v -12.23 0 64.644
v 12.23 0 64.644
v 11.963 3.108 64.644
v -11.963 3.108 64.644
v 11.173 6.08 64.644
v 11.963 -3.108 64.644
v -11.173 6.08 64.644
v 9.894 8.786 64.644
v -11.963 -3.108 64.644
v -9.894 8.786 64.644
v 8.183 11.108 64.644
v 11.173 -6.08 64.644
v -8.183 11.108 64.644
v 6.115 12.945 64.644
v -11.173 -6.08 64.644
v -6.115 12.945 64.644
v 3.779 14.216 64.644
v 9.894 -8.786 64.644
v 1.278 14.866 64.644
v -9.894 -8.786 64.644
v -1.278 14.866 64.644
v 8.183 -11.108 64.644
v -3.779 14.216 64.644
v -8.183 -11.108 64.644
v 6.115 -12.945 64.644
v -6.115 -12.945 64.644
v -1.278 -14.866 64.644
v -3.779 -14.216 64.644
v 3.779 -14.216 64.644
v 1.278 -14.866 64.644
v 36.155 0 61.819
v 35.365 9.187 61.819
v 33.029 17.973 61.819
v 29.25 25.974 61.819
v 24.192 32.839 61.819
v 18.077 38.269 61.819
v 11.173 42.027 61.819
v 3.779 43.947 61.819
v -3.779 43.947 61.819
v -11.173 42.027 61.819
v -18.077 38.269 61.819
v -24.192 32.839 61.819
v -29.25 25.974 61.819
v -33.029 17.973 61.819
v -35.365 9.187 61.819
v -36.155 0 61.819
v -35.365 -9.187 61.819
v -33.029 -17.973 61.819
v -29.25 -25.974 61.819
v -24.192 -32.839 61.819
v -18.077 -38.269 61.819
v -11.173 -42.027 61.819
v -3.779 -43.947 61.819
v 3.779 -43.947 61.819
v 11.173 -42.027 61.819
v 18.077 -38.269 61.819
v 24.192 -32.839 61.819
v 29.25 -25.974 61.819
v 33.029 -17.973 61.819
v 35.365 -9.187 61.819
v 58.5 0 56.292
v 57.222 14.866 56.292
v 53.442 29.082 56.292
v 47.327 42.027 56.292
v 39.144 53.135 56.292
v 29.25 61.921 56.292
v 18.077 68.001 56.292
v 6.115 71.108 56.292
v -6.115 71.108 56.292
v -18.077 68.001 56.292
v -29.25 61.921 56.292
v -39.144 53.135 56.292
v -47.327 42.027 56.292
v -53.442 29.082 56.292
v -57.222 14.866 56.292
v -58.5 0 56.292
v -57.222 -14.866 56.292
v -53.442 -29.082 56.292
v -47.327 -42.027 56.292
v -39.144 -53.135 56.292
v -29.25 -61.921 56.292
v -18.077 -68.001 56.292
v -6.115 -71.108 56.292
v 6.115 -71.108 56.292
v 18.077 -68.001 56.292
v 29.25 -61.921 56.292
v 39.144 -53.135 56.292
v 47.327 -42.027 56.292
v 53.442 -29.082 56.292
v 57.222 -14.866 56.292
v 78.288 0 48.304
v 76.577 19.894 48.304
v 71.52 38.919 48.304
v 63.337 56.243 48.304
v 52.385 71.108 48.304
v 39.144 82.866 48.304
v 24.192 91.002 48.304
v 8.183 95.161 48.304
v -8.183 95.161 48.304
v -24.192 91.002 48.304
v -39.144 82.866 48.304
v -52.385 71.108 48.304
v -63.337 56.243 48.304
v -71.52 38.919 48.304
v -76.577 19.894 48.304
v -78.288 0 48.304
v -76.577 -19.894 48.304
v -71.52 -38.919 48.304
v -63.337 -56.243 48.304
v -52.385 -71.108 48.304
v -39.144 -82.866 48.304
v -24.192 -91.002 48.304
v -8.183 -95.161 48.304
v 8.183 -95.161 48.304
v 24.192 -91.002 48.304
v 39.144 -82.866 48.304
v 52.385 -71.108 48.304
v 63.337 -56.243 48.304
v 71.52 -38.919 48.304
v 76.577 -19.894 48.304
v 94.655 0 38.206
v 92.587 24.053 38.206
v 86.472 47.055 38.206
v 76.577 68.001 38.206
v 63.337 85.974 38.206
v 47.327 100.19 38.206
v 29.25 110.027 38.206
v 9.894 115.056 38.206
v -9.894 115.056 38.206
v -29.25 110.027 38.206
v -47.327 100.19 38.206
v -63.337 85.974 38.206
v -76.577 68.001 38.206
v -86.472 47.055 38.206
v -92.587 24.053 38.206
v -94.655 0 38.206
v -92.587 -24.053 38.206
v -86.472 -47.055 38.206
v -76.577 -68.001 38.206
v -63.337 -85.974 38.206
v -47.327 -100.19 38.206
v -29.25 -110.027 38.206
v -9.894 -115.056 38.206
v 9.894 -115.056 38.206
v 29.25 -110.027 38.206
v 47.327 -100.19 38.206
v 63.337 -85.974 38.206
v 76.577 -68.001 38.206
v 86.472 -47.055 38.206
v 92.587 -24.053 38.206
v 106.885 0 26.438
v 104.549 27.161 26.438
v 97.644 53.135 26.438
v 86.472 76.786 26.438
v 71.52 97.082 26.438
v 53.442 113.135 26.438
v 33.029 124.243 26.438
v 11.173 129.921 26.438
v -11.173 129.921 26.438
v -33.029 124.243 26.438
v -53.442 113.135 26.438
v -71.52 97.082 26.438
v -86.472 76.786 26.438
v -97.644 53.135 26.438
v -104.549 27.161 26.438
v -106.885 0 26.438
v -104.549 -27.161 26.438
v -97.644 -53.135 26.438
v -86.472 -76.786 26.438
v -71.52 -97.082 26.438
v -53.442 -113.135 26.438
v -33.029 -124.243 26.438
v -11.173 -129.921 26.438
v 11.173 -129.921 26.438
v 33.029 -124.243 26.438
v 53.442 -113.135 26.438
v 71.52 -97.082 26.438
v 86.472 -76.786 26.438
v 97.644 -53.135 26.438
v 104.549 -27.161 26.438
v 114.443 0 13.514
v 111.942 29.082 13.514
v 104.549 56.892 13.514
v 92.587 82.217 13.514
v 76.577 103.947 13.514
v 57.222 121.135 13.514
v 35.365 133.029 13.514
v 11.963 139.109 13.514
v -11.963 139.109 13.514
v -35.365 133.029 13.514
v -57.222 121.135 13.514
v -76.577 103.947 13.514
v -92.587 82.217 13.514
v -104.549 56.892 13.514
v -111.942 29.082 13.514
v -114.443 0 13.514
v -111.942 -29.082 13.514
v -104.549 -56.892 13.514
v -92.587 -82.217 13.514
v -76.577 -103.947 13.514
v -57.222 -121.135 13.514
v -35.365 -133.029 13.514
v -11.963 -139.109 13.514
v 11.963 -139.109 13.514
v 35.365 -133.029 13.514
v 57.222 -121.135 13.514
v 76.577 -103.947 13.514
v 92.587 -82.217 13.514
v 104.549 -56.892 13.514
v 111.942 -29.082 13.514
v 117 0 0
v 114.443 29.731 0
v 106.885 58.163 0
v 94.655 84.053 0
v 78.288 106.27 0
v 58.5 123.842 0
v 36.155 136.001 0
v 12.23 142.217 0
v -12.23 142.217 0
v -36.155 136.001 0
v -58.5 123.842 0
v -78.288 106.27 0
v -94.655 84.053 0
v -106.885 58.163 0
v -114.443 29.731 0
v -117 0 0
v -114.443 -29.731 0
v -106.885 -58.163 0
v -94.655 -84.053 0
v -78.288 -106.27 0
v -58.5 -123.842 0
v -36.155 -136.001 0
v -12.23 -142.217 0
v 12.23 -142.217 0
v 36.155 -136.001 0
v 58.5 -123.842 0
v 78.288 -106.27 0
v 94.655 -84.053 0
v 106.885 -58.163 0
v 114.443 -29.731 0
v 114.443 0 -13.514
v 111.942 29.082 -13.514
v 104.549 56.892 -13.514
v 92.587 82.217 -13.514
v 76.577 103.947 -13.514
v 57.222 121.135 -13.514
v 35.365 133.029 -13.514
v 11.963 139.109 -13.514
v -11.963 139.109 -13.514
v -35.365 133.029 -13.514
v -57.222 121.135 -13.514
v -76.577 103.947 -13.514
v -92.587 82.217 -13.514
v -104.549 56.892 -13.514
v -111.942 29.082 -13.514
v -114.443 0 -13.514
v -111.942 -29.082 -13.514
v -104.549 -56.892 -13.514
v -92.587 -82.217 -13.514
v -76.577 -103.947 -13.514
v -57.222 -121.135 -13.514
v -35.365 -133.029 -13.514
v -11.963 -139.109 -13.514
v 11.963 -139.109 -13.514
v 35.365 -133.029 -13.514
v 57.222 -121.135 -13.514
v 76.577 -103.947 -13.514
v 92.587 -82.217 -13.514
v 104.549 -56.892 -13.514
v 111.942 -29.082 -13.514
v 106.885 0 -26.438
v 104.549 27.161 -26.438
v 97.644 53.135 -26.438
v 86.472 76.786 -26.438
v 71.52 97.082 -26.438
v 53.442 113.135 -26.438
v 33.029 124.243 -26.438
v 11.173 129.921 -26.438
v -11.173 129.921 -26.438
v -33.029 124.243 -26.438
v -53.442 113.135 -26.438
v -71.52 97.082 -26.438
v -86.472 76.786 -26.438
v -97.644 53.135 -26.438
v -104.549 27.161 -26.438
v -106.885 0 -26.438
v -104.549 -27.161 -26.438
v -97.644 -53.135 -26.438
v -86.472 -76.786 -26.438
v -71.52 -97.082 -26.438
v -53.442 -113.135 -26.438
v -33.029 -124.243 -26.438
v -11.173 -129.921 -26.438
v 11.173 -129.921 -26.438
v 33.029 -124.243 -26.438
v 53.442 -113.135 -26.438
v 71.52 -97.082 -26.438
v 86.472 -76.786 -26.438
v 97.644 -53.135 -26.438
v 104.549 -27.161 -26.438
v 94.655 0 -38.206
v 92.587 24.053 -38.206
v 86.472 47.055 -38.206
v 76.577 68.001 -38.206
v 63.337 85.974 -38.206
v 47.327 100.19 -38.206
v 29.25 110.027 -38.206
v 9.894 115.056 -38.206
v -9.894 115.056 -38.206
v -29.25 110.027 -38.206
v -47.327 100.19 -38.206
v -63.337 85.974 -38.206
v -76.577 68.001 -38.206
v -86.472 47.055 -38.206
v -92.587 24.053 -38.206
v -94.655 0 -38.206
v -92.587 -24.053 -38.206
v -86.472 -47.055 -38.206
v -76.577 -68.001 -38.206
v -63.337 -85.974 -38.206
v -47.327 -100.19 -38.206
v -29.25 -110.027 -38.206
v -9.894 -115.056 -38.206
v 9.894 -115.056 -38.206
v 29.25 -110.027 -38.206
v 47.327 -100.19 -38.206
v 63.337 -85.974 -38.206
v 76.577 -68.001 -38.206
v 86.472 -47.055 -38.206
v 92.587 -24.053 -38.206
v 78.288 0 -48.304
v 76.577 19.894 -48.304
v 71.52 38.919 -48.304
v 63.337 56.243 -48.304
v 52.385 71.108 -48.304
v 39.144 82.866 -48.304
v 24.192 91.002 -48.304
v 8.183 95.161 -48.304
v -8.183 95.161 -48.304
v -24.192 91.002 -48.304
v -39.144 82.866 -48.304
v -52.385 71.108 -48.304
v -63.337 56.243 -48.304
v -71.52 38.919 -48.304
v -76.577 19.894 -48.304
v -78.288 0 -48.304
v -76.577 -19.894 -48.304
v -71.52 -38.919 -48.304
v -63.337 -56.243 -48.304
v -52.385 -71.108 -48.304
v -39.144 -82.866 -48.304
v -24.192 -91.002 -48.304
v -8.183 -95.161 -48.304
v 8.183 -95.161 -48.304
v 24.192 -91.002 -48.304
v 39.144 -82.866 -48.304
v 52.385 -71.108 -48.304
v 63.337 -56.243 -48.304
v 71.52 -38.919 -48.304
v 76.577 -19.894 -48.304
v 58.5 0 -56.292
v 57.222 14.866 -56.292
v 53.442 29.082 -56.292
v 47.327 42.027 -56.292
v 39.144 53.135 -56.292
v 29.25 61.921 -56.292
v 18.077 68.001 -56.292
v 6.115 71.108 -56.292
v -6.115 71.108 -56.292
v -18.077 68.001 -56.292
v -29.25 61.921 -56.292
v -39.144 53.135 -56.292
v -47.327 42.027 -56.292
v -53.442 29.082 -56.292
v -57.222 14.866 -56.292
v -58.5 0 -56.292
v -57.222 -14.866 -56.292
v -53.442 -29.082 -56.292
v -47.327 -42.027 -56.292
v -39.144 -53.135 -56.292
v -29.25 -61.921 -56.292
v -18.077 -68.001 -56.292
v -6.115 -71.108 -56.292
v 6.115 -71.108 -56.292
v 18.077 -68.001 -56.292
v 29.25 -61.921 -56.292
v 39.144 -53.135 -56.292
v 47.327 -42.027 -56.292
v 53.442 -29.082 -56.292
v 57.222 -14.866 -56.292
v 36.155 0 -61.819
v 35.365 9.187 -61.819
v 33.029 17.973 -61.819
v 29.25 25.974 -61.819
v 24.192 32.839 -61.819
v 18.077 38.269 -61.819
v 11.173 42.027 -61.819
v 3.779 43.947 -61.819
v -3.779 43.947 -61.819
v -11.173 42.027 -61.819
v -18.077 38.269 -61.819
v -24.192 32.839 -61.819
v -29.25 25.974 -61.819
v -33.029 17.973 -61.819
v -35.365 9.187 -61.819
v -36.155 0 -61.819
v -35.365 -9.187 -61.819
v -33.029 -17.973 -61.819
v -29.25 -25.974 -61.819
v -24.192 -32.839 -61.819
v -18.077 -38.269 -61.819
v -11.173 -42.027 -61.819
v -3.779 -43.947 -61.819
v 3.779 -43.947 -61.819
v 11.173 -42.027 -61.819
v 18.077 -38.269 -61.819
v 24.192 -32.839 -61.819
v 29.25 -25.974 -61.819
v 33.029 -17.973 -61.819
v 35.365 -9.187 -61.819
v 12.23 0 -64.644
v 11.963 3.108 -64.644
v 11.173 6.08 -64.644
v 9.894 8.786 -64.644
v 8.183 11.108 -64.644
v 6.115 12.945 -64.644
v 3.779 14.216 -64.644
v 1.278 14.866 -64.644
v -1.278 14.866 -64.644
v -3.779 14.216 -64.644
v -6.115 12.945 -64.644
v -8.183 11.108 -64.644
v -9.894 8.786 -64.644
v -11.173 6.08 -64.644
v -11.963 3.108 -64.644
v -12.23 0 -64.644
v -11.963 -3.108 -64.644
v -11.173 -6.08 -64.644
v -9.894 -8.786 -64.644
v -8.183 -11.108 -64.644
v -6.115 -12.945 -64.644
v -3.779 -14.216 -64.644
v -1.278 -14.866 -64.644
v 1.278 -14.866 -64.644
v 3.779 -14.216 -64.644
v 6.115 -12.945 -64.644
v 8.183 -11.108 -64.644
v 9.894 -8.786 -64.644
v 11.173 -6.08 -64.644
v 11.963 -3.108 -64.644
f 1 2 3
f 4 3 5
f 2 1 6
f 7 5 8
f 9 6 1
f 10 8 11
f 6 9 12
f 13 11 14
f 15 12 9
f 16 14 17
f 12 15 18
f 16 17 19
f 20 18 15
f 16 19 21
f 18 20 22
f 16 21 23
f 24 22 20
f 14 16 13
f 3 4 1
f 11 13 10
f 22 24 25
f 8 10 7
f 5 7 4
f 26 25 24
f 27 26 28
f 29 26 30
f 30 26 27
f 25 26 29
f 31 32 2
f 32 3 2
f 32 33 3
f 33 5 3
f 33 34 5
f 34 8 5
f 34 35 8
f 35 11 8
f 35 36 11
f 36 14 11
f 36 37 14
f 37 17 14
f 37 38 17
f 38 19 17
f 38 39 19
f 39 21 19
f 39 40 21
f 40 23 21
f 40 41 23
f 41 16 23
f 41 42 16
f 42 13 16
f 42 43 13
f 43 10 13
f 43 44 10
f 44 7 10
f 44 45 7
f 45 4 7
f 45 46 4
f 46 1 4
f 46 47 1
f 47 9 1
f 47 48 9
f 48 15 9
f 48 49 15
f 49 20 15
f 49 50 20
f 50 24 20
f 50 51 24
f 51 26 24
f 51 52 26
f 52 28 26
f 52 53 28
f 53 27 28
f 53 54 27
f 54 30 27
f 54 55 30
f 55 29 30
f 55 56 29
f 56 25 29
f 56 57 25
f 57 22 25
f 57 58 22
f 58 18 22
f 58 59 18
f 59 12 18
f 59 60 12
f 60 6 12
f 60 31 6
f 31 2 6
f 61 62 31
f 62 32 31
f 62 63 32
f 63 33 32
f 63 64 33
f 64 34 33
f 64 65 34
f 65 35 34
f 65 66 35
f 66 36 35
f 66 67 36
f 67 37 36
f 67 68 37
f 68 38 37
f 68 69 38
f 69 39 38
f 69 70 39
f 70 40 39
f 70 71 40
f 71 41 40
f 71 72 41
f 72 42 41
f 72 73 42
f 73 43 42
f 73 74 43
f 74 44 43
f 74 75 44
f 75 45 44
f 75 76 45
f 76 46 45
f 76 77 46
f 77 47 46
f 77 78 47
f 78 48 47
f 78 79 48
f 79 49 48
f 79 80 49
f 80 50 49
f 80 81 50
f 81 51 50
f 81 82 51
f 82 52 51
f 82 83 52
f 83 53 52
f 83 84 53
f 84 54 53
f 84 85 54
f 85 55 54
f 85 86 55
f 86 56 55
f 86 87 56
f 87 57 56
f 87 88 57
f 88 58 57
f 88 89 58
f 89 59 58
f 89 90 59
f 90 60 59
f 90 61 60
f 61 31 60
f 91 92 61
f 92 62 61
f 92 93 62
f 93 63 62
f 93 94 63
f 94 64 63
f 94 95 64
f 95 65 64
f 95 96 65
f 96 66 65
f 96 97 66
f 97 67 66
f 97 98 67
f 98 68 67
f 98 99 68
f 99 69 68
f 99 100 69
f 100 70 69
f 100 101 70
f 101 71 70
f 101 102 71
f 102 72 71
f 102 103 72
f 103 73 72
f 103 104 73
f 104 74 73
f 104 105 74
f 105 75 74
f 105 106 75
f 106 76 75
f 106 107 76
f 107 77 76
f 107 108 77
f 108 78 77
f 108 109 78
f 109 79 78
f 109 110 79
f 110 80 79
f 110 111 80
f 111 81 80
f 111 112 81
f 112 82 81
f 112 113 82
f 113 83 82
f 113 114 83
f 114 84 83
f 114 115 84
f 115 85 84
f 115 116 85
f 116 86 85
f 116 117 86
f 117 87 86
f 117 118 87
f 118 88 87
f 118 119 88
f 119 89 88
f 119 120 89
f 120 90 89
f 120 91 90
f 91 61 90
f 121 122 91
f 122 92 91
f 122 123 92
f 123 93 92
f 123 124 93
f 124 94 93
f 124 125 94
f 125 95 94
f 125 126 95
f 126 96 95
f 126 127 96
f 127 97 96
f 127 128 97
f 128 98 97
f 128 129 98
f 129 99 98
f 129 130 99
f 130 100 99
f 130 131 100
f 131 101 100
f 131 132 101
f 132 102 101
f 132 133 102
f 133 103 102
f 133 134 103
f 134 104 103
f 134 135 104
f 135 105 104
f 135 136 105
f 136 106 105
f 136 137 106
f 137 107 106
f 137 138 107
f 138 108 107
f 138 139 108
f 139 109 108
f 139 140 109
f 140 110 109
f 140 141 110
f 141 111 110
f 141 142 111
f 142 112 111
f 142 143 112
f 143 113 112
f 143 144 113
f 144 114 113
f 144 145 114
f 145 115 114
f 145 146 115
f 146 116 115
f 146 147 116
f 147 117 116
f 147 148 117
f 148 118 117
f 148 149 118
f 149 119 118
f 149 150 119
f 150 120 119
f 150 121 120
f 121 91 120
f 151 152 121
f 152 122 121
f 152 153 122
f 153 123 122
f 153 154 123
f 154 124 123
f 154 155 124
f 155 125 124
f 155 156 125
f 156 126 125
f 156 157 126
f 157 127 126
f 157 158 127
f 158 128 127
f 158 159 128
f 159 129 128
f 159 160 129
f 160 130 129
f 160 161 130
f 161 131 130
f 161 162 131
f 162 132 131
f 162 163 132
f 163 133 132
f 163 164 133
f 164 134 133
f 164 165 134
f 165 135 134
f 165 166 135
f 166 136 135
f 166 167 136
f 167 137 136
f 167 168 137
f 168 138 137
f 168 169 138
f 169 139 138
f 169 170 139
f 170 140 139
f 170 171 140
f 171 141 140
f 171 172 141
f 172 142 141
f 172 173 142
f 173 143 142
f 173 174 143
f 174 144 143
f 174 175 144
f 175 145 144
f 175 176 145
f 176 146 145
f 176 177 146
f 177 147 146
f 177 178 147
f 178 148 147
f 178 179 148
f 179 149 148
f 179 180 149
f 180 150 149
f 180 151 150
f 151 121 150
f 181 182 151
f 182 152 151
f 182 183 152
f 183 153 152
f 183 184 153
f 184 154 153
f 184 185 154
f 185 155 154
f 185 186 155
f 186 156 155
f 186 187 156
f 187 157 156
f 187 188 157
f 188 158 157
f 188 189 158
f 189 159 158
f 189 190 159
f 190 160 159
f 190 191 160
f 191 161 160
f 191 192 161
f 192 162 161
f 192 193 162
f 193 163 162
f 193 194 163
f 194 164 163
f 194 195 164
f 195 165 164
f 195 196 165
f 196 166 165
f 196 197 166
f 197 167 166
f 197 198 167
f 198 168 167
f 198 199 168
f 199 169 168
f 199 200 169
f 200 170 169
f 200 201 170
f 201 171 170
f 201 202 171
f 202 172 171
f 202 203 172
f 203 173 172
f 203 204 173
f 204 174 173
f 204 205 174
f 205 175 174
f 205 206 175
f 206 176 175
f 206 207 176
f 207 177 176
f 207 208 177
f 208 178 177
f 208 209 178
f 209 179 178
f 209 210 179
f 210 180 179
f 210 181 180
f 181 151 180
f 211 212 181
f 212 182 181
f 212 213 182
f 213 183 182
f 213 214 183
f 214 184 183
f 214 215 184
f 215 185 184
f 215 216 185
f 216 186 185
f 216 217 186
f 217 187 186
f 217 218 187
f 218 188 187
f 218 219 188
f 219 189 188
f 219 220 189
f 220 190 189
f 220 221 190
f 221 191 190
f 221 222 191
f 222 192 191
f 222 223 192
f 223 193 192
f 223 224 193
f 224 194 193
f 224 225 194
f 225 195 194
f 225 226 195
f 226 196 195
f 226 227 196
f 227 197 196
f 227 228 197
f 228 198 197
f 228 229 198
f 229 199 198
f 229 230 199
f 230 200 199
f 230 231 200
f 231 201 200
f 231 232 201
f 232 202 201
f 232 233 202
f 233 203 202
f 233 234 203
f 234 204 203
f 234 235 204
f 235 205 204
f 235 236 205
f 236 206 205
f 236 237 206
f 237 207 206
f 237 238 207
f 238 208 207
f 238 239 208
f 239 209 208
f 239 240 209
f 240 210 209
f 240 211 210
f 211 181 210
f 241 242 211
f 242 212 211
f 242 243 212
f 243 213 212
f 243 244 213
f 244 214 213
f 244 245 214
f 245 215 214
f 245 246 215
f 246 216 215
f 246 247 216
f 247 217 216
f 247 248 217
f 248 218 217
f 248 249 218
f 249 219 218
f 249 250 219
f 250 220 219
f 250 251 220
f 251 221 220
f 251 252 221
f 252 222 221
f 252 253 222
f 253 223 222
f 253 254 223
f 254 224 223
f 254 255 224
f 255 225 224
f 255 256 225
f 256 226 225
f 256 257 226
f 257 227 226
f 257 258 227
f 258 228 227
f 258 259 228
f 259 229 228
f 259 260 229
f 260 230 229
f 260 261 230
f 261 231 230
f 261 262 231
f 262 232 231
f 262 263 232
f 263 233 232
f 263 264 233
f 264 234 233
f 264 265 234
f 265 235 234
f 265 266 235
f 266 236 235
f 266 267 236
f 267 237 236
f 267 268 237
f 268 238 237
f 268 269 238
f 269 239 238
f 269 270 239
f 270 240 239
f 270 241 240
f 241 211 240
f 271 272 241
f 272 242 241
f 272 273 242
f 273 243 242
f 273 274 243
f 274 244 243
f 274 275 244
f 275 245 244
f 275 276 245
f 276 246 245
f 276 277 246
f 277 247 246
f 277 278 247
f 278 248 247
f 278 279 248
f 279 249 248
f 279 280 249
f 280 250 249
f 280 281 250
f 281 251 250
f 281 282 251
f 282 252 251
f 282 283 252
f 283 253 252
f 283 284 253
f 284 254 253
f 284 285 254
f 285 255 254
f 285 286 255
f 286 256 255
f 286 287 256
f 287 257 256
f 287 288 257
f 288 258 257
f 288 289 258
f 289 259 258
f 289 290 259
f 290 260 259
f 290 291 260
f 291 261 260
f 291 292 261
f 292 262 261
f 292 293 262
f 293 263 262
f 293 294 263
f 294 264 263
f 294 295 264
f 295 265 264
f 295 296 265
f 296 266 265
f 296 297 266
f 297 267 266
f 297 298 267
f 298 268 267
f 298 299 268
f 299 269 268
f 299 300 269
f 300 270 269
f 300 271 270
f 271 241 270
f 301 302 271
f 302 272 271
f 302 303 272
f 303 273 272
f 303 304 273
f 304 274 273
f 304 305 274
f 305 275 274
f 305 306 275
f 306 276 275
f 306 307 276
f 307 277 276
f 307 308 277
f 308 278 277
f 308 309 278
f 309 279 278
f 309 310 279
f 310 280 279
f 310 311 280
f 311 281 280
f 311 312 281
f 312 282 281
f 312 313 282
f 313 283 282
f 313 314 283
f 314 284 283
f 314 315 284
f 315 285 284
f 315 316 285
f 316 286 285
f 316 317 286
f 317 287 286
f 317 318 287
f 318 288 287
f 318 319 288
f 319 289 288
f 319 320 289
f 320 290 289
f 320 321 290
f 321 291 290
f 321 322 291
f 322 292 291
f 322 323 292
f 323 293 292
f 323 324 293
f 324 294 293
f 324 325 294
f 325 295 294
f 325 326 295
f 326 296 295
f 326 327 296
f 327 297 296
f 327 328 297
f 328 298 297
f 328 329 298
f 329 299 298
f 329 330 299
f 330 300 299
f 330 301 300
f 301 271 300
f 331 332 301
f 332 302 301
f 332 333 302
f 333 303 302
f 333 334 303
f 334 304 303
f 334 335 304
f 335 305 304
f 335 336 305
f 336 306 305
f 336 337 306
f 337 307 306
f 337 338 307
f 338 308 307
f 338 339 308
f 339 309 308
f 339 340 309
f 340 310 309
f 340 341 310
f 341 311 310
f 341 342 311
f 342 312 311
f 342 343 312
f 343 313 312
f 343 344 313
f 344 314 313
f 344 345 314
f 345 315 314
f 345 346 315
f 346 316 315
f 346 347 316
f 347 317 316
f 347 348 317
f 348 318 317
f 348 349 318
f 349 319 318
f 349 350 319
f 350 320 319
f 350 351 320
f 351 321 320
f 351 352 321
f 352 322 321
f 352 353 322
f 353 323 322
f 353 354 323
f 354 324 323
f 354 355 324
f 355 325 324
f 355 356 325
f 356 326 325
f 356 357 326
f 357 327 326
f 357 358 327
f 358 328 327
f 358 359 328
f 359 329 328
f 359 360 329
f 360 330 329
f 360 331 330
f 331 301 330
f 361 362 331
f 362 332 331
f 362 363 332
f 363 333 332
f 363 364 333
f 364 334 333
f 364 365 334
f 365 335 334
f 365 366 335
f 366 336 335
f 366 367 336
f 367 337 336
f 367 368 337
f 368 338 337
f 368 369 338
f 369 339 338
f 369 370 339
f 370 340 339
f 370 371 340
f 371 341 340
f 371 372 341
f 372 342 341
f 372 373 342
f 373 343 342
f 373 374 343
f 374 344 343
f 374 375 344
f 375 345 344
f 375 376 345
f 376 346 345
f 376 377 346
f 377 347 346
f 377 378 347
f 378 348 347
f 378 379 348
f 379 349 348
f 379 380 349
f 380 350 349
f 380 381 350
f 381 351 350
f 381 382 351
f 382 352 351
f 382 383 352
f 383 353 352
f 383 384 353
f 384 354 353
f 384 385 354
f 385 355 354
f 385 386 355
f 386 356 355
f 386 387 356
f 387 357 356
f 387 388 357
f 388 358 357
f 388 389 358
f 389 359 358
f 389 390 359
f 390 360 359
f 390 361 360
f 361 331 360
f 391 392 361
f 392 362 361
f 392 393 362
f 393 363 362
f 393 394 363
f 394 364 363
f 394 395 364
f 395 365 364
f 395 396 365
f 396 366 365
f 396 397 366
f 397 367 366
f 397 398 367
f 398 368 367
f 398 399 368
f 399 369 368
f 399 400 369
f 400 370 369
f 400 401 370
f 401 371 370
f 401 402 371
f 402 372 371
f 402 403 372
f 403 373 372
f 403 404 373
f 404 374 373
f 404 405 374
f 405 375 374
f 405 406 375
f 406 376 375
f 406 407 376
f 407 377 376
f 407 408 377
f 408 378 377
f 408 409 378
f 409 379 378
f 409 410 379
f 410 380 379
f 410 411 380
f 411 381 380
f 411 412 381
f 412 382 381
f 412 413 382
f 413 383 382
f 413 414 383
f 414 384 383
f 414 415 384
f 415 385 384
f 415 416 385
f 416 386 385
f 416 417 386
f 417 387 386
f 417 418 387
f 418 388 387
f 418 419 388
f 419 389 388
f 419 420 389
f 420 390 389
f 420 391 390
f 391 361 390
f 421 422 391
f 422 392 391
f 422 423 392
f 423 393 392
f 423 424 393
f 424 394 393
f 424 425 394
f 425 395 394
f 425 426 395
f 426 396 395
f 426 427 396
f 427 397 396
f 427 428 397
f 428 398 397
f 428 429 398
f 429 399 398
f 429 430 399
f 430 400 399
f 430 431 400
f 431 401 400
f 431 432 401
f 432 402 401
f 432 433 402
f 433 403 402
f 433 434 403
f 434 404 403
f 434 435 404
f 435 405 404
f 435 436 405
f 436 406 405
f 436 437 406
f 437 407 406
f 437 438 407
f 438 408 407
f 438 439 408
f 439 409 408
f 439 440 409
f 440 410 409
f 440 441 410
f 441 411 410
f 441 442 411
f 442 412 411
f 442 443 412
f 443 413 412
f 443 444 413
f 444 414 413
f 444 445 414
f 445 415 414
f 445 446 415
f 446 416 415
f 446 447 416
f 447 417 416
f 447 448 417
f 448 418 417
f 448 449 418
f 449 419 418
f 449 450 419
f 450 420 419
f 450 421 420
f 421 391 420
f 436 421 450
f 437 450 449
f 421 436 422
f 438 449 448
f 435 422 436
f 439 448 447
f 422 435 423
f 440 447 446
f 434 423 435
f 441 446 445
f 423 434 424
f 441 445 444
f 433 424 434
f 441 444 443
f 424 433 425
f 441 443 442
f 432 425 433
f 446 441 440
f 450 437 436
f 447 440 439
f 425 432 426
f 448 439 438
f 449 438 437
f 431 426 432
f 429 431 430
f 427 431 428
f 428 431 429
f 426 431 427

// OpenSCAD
// Generated by SolidPython 1.0.1 on 2020-07-29 00:46:48


scale(v = [9, 11, 5]) {
	sphere(r = 13);
}
/***********************************************
*********      SolidPython code:      **********
************************************************
 
# import packages: SolidPython
from solid import *
from solid.utils import *
from itertools import chain, combinations, permutations


class Resize:

    def __init__(self, scad_file):
        self.scad_file = scad_file
        #self.scad_file = import_scad(scad_file)
        # cone/cylinder param:
        self.r1 = 0
        self.r2 = 0
        self.h = 0
        # rectangular prism param:
        self.w = 0
        self.l = 0
        # ellipse param:
        self.r = 0

    # import OpenScad code (file name corresponds to shape)


    # classify shape + parameters
    def assign(self, param1, param2, param3):
        if self.scad_file == 'cone.scad':
            self.r1 = param1
            self.r2 = param2
            self.h = param3
        elif self.scad_file == 'cylinder.scad':
            self.r1 = param1
            self.r2 = param2
            self.h = param3
        elif self.scad_file == 'rectangularPrism.scad':
            self.h = param1
            self.l = param2
            self.w = param3
        else:
            self.r = param1
            self.h = param2

    # resize parameters
    def iterate(self):
        x = range(3, 20, 2)
        i = 1
        if self.scad_file == 'cone.scad':
            tempList = list(permutations(x, 2))
            for temp in tempList:
                param1 = temp[0]
                param2 = temp[1]
                filepath = 'produced_scad_files/' + 'cone' + str(param1) + '_' + str(param2) + '_' + '.scad'
                scad_render_to_file(cylinder(h=param1, r1=param2, r2=0), filepath)

        elif self.scad_file == 'cylinder.scad':
            tempList = list(permutations(x, 3))
            for temp in tempList:
                param1 = temp[0]
                param2 = temp[1]
                filepath = 'produced_scad_files/' + 'cylinder' + str(param1) + '_' + str(param2) + '_' + '.scad'
                scad_render_to_file(cylinder(h=param1, r1=param2, r2=param2), filepath)

        elif self.scad_file == 'rectangularPrism.scad':
            tempList = list(permutations(x, 3))
            for temp in tempList:
                param1 = temp[0]
                param2 = temp[1]
                param3 = temp[2]
                filepath = 'produced_scad_files/' + 'rectangularPrism' + str(param1) + '_' + str(param2) + '_' + str(
                    param3) + '.scad'
                scad_render_to_file(cube(size=(param1, param2, param3)), filepath)

        elif self.scad_file == 'ellipse.scad':
            tempList = list(permutations(x, 4))
            for temp in tempList:
                param1 = temp[0]
                param2 = temp[1]
                param3 = temp[2]
                param4 = temp[3]
                filepath = 'produced_scad_files/' + 'ellipse' + str(param1) + '_' + str(param2) + '_' + str(param3) + '_' + str(param4) + '.scad'
                scad_render_to_file(scale([param1, param2, param3])(sphere(r=param4)), filepath)

    def render_to_scadfile(self):
        scad_render_to_file(scad, 'example.scad') 
 
************************************************/
